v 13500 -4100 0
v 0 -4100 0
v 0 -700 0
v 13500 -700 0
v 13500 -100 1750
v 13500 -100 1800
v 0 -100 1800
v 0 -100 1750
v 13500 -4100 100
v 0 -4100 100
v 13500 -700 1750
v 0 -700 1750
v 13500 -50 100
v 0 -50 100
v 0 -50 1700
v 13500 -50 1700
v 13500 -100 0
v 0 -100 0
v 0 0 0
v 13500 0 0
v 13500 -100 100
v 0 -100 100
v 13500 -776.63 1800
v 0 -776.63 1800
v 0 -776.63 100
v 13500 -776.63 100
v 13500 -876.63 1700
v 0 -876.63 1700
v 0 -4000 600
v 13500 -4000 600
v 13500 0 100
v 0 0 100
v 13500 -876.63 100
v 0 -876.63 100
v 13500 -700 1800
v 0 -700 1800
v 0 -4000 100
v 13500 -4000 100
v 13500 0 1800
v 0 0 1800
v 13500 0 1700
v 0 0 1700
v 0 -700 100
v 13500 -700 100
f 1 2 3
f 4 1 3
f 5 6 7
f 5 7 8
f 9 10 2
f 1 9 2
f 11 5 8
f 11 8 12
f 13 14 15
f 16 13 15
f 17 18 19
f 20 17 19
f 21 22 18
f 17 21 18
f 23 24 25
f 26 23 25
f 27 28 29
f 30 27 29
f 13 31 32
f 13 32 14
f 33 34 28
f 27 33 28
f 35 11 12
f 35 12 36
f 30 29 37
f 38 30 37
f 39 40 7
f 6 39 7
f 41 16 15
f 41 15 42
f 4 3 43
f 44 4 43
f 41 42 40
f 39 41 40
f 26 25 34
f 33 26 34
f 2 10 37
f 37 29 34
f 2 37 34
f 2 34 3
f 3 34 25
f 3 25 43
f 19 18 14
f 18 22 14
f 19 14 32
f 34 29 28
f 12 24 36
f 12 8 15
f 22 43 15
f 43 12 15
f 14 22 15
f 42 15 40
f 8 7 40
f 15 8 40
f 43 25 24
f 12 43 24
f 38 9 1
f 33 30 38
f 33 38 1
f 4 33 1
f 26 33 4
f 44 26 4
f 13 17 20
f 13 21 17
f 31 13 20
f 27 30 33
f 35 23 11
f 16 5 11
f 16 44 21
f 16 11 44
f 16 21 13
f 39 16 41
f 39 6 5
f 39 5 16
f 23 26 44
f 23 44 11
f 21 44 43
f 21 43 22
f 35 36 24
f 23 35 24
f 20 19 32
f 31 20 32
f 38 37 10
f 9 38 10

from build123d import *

# Parameters (mm, degrees)
F1_DEPTH = 13500


with BuildPart() as f1:
    # F0 (on Right) → F1 (new body)
    with BuildSketch(Plane.YZ):
        Polygon((-100, 0), (0, 0), (0, 100), (-50, 100), (-50, 1700), (0, 1700), (0, 1800), (-100, 1800), (-100, 1750), (-700, 1750), (-700, 1800), (-776.63, 1800), (-776.63, 1750), (-776.63, 100), (-876.63, 100.000002), (-876.63, 1700.000002), (-4000, 600), (-4000, 100), (-4100, 100), (-4100, 0), (-900, 0), (-800, 0), (-700, 0), (-700, 100), (-100, 100), align=None)
    extrude(amount=F1_DEPTH)


solid = f1.part
